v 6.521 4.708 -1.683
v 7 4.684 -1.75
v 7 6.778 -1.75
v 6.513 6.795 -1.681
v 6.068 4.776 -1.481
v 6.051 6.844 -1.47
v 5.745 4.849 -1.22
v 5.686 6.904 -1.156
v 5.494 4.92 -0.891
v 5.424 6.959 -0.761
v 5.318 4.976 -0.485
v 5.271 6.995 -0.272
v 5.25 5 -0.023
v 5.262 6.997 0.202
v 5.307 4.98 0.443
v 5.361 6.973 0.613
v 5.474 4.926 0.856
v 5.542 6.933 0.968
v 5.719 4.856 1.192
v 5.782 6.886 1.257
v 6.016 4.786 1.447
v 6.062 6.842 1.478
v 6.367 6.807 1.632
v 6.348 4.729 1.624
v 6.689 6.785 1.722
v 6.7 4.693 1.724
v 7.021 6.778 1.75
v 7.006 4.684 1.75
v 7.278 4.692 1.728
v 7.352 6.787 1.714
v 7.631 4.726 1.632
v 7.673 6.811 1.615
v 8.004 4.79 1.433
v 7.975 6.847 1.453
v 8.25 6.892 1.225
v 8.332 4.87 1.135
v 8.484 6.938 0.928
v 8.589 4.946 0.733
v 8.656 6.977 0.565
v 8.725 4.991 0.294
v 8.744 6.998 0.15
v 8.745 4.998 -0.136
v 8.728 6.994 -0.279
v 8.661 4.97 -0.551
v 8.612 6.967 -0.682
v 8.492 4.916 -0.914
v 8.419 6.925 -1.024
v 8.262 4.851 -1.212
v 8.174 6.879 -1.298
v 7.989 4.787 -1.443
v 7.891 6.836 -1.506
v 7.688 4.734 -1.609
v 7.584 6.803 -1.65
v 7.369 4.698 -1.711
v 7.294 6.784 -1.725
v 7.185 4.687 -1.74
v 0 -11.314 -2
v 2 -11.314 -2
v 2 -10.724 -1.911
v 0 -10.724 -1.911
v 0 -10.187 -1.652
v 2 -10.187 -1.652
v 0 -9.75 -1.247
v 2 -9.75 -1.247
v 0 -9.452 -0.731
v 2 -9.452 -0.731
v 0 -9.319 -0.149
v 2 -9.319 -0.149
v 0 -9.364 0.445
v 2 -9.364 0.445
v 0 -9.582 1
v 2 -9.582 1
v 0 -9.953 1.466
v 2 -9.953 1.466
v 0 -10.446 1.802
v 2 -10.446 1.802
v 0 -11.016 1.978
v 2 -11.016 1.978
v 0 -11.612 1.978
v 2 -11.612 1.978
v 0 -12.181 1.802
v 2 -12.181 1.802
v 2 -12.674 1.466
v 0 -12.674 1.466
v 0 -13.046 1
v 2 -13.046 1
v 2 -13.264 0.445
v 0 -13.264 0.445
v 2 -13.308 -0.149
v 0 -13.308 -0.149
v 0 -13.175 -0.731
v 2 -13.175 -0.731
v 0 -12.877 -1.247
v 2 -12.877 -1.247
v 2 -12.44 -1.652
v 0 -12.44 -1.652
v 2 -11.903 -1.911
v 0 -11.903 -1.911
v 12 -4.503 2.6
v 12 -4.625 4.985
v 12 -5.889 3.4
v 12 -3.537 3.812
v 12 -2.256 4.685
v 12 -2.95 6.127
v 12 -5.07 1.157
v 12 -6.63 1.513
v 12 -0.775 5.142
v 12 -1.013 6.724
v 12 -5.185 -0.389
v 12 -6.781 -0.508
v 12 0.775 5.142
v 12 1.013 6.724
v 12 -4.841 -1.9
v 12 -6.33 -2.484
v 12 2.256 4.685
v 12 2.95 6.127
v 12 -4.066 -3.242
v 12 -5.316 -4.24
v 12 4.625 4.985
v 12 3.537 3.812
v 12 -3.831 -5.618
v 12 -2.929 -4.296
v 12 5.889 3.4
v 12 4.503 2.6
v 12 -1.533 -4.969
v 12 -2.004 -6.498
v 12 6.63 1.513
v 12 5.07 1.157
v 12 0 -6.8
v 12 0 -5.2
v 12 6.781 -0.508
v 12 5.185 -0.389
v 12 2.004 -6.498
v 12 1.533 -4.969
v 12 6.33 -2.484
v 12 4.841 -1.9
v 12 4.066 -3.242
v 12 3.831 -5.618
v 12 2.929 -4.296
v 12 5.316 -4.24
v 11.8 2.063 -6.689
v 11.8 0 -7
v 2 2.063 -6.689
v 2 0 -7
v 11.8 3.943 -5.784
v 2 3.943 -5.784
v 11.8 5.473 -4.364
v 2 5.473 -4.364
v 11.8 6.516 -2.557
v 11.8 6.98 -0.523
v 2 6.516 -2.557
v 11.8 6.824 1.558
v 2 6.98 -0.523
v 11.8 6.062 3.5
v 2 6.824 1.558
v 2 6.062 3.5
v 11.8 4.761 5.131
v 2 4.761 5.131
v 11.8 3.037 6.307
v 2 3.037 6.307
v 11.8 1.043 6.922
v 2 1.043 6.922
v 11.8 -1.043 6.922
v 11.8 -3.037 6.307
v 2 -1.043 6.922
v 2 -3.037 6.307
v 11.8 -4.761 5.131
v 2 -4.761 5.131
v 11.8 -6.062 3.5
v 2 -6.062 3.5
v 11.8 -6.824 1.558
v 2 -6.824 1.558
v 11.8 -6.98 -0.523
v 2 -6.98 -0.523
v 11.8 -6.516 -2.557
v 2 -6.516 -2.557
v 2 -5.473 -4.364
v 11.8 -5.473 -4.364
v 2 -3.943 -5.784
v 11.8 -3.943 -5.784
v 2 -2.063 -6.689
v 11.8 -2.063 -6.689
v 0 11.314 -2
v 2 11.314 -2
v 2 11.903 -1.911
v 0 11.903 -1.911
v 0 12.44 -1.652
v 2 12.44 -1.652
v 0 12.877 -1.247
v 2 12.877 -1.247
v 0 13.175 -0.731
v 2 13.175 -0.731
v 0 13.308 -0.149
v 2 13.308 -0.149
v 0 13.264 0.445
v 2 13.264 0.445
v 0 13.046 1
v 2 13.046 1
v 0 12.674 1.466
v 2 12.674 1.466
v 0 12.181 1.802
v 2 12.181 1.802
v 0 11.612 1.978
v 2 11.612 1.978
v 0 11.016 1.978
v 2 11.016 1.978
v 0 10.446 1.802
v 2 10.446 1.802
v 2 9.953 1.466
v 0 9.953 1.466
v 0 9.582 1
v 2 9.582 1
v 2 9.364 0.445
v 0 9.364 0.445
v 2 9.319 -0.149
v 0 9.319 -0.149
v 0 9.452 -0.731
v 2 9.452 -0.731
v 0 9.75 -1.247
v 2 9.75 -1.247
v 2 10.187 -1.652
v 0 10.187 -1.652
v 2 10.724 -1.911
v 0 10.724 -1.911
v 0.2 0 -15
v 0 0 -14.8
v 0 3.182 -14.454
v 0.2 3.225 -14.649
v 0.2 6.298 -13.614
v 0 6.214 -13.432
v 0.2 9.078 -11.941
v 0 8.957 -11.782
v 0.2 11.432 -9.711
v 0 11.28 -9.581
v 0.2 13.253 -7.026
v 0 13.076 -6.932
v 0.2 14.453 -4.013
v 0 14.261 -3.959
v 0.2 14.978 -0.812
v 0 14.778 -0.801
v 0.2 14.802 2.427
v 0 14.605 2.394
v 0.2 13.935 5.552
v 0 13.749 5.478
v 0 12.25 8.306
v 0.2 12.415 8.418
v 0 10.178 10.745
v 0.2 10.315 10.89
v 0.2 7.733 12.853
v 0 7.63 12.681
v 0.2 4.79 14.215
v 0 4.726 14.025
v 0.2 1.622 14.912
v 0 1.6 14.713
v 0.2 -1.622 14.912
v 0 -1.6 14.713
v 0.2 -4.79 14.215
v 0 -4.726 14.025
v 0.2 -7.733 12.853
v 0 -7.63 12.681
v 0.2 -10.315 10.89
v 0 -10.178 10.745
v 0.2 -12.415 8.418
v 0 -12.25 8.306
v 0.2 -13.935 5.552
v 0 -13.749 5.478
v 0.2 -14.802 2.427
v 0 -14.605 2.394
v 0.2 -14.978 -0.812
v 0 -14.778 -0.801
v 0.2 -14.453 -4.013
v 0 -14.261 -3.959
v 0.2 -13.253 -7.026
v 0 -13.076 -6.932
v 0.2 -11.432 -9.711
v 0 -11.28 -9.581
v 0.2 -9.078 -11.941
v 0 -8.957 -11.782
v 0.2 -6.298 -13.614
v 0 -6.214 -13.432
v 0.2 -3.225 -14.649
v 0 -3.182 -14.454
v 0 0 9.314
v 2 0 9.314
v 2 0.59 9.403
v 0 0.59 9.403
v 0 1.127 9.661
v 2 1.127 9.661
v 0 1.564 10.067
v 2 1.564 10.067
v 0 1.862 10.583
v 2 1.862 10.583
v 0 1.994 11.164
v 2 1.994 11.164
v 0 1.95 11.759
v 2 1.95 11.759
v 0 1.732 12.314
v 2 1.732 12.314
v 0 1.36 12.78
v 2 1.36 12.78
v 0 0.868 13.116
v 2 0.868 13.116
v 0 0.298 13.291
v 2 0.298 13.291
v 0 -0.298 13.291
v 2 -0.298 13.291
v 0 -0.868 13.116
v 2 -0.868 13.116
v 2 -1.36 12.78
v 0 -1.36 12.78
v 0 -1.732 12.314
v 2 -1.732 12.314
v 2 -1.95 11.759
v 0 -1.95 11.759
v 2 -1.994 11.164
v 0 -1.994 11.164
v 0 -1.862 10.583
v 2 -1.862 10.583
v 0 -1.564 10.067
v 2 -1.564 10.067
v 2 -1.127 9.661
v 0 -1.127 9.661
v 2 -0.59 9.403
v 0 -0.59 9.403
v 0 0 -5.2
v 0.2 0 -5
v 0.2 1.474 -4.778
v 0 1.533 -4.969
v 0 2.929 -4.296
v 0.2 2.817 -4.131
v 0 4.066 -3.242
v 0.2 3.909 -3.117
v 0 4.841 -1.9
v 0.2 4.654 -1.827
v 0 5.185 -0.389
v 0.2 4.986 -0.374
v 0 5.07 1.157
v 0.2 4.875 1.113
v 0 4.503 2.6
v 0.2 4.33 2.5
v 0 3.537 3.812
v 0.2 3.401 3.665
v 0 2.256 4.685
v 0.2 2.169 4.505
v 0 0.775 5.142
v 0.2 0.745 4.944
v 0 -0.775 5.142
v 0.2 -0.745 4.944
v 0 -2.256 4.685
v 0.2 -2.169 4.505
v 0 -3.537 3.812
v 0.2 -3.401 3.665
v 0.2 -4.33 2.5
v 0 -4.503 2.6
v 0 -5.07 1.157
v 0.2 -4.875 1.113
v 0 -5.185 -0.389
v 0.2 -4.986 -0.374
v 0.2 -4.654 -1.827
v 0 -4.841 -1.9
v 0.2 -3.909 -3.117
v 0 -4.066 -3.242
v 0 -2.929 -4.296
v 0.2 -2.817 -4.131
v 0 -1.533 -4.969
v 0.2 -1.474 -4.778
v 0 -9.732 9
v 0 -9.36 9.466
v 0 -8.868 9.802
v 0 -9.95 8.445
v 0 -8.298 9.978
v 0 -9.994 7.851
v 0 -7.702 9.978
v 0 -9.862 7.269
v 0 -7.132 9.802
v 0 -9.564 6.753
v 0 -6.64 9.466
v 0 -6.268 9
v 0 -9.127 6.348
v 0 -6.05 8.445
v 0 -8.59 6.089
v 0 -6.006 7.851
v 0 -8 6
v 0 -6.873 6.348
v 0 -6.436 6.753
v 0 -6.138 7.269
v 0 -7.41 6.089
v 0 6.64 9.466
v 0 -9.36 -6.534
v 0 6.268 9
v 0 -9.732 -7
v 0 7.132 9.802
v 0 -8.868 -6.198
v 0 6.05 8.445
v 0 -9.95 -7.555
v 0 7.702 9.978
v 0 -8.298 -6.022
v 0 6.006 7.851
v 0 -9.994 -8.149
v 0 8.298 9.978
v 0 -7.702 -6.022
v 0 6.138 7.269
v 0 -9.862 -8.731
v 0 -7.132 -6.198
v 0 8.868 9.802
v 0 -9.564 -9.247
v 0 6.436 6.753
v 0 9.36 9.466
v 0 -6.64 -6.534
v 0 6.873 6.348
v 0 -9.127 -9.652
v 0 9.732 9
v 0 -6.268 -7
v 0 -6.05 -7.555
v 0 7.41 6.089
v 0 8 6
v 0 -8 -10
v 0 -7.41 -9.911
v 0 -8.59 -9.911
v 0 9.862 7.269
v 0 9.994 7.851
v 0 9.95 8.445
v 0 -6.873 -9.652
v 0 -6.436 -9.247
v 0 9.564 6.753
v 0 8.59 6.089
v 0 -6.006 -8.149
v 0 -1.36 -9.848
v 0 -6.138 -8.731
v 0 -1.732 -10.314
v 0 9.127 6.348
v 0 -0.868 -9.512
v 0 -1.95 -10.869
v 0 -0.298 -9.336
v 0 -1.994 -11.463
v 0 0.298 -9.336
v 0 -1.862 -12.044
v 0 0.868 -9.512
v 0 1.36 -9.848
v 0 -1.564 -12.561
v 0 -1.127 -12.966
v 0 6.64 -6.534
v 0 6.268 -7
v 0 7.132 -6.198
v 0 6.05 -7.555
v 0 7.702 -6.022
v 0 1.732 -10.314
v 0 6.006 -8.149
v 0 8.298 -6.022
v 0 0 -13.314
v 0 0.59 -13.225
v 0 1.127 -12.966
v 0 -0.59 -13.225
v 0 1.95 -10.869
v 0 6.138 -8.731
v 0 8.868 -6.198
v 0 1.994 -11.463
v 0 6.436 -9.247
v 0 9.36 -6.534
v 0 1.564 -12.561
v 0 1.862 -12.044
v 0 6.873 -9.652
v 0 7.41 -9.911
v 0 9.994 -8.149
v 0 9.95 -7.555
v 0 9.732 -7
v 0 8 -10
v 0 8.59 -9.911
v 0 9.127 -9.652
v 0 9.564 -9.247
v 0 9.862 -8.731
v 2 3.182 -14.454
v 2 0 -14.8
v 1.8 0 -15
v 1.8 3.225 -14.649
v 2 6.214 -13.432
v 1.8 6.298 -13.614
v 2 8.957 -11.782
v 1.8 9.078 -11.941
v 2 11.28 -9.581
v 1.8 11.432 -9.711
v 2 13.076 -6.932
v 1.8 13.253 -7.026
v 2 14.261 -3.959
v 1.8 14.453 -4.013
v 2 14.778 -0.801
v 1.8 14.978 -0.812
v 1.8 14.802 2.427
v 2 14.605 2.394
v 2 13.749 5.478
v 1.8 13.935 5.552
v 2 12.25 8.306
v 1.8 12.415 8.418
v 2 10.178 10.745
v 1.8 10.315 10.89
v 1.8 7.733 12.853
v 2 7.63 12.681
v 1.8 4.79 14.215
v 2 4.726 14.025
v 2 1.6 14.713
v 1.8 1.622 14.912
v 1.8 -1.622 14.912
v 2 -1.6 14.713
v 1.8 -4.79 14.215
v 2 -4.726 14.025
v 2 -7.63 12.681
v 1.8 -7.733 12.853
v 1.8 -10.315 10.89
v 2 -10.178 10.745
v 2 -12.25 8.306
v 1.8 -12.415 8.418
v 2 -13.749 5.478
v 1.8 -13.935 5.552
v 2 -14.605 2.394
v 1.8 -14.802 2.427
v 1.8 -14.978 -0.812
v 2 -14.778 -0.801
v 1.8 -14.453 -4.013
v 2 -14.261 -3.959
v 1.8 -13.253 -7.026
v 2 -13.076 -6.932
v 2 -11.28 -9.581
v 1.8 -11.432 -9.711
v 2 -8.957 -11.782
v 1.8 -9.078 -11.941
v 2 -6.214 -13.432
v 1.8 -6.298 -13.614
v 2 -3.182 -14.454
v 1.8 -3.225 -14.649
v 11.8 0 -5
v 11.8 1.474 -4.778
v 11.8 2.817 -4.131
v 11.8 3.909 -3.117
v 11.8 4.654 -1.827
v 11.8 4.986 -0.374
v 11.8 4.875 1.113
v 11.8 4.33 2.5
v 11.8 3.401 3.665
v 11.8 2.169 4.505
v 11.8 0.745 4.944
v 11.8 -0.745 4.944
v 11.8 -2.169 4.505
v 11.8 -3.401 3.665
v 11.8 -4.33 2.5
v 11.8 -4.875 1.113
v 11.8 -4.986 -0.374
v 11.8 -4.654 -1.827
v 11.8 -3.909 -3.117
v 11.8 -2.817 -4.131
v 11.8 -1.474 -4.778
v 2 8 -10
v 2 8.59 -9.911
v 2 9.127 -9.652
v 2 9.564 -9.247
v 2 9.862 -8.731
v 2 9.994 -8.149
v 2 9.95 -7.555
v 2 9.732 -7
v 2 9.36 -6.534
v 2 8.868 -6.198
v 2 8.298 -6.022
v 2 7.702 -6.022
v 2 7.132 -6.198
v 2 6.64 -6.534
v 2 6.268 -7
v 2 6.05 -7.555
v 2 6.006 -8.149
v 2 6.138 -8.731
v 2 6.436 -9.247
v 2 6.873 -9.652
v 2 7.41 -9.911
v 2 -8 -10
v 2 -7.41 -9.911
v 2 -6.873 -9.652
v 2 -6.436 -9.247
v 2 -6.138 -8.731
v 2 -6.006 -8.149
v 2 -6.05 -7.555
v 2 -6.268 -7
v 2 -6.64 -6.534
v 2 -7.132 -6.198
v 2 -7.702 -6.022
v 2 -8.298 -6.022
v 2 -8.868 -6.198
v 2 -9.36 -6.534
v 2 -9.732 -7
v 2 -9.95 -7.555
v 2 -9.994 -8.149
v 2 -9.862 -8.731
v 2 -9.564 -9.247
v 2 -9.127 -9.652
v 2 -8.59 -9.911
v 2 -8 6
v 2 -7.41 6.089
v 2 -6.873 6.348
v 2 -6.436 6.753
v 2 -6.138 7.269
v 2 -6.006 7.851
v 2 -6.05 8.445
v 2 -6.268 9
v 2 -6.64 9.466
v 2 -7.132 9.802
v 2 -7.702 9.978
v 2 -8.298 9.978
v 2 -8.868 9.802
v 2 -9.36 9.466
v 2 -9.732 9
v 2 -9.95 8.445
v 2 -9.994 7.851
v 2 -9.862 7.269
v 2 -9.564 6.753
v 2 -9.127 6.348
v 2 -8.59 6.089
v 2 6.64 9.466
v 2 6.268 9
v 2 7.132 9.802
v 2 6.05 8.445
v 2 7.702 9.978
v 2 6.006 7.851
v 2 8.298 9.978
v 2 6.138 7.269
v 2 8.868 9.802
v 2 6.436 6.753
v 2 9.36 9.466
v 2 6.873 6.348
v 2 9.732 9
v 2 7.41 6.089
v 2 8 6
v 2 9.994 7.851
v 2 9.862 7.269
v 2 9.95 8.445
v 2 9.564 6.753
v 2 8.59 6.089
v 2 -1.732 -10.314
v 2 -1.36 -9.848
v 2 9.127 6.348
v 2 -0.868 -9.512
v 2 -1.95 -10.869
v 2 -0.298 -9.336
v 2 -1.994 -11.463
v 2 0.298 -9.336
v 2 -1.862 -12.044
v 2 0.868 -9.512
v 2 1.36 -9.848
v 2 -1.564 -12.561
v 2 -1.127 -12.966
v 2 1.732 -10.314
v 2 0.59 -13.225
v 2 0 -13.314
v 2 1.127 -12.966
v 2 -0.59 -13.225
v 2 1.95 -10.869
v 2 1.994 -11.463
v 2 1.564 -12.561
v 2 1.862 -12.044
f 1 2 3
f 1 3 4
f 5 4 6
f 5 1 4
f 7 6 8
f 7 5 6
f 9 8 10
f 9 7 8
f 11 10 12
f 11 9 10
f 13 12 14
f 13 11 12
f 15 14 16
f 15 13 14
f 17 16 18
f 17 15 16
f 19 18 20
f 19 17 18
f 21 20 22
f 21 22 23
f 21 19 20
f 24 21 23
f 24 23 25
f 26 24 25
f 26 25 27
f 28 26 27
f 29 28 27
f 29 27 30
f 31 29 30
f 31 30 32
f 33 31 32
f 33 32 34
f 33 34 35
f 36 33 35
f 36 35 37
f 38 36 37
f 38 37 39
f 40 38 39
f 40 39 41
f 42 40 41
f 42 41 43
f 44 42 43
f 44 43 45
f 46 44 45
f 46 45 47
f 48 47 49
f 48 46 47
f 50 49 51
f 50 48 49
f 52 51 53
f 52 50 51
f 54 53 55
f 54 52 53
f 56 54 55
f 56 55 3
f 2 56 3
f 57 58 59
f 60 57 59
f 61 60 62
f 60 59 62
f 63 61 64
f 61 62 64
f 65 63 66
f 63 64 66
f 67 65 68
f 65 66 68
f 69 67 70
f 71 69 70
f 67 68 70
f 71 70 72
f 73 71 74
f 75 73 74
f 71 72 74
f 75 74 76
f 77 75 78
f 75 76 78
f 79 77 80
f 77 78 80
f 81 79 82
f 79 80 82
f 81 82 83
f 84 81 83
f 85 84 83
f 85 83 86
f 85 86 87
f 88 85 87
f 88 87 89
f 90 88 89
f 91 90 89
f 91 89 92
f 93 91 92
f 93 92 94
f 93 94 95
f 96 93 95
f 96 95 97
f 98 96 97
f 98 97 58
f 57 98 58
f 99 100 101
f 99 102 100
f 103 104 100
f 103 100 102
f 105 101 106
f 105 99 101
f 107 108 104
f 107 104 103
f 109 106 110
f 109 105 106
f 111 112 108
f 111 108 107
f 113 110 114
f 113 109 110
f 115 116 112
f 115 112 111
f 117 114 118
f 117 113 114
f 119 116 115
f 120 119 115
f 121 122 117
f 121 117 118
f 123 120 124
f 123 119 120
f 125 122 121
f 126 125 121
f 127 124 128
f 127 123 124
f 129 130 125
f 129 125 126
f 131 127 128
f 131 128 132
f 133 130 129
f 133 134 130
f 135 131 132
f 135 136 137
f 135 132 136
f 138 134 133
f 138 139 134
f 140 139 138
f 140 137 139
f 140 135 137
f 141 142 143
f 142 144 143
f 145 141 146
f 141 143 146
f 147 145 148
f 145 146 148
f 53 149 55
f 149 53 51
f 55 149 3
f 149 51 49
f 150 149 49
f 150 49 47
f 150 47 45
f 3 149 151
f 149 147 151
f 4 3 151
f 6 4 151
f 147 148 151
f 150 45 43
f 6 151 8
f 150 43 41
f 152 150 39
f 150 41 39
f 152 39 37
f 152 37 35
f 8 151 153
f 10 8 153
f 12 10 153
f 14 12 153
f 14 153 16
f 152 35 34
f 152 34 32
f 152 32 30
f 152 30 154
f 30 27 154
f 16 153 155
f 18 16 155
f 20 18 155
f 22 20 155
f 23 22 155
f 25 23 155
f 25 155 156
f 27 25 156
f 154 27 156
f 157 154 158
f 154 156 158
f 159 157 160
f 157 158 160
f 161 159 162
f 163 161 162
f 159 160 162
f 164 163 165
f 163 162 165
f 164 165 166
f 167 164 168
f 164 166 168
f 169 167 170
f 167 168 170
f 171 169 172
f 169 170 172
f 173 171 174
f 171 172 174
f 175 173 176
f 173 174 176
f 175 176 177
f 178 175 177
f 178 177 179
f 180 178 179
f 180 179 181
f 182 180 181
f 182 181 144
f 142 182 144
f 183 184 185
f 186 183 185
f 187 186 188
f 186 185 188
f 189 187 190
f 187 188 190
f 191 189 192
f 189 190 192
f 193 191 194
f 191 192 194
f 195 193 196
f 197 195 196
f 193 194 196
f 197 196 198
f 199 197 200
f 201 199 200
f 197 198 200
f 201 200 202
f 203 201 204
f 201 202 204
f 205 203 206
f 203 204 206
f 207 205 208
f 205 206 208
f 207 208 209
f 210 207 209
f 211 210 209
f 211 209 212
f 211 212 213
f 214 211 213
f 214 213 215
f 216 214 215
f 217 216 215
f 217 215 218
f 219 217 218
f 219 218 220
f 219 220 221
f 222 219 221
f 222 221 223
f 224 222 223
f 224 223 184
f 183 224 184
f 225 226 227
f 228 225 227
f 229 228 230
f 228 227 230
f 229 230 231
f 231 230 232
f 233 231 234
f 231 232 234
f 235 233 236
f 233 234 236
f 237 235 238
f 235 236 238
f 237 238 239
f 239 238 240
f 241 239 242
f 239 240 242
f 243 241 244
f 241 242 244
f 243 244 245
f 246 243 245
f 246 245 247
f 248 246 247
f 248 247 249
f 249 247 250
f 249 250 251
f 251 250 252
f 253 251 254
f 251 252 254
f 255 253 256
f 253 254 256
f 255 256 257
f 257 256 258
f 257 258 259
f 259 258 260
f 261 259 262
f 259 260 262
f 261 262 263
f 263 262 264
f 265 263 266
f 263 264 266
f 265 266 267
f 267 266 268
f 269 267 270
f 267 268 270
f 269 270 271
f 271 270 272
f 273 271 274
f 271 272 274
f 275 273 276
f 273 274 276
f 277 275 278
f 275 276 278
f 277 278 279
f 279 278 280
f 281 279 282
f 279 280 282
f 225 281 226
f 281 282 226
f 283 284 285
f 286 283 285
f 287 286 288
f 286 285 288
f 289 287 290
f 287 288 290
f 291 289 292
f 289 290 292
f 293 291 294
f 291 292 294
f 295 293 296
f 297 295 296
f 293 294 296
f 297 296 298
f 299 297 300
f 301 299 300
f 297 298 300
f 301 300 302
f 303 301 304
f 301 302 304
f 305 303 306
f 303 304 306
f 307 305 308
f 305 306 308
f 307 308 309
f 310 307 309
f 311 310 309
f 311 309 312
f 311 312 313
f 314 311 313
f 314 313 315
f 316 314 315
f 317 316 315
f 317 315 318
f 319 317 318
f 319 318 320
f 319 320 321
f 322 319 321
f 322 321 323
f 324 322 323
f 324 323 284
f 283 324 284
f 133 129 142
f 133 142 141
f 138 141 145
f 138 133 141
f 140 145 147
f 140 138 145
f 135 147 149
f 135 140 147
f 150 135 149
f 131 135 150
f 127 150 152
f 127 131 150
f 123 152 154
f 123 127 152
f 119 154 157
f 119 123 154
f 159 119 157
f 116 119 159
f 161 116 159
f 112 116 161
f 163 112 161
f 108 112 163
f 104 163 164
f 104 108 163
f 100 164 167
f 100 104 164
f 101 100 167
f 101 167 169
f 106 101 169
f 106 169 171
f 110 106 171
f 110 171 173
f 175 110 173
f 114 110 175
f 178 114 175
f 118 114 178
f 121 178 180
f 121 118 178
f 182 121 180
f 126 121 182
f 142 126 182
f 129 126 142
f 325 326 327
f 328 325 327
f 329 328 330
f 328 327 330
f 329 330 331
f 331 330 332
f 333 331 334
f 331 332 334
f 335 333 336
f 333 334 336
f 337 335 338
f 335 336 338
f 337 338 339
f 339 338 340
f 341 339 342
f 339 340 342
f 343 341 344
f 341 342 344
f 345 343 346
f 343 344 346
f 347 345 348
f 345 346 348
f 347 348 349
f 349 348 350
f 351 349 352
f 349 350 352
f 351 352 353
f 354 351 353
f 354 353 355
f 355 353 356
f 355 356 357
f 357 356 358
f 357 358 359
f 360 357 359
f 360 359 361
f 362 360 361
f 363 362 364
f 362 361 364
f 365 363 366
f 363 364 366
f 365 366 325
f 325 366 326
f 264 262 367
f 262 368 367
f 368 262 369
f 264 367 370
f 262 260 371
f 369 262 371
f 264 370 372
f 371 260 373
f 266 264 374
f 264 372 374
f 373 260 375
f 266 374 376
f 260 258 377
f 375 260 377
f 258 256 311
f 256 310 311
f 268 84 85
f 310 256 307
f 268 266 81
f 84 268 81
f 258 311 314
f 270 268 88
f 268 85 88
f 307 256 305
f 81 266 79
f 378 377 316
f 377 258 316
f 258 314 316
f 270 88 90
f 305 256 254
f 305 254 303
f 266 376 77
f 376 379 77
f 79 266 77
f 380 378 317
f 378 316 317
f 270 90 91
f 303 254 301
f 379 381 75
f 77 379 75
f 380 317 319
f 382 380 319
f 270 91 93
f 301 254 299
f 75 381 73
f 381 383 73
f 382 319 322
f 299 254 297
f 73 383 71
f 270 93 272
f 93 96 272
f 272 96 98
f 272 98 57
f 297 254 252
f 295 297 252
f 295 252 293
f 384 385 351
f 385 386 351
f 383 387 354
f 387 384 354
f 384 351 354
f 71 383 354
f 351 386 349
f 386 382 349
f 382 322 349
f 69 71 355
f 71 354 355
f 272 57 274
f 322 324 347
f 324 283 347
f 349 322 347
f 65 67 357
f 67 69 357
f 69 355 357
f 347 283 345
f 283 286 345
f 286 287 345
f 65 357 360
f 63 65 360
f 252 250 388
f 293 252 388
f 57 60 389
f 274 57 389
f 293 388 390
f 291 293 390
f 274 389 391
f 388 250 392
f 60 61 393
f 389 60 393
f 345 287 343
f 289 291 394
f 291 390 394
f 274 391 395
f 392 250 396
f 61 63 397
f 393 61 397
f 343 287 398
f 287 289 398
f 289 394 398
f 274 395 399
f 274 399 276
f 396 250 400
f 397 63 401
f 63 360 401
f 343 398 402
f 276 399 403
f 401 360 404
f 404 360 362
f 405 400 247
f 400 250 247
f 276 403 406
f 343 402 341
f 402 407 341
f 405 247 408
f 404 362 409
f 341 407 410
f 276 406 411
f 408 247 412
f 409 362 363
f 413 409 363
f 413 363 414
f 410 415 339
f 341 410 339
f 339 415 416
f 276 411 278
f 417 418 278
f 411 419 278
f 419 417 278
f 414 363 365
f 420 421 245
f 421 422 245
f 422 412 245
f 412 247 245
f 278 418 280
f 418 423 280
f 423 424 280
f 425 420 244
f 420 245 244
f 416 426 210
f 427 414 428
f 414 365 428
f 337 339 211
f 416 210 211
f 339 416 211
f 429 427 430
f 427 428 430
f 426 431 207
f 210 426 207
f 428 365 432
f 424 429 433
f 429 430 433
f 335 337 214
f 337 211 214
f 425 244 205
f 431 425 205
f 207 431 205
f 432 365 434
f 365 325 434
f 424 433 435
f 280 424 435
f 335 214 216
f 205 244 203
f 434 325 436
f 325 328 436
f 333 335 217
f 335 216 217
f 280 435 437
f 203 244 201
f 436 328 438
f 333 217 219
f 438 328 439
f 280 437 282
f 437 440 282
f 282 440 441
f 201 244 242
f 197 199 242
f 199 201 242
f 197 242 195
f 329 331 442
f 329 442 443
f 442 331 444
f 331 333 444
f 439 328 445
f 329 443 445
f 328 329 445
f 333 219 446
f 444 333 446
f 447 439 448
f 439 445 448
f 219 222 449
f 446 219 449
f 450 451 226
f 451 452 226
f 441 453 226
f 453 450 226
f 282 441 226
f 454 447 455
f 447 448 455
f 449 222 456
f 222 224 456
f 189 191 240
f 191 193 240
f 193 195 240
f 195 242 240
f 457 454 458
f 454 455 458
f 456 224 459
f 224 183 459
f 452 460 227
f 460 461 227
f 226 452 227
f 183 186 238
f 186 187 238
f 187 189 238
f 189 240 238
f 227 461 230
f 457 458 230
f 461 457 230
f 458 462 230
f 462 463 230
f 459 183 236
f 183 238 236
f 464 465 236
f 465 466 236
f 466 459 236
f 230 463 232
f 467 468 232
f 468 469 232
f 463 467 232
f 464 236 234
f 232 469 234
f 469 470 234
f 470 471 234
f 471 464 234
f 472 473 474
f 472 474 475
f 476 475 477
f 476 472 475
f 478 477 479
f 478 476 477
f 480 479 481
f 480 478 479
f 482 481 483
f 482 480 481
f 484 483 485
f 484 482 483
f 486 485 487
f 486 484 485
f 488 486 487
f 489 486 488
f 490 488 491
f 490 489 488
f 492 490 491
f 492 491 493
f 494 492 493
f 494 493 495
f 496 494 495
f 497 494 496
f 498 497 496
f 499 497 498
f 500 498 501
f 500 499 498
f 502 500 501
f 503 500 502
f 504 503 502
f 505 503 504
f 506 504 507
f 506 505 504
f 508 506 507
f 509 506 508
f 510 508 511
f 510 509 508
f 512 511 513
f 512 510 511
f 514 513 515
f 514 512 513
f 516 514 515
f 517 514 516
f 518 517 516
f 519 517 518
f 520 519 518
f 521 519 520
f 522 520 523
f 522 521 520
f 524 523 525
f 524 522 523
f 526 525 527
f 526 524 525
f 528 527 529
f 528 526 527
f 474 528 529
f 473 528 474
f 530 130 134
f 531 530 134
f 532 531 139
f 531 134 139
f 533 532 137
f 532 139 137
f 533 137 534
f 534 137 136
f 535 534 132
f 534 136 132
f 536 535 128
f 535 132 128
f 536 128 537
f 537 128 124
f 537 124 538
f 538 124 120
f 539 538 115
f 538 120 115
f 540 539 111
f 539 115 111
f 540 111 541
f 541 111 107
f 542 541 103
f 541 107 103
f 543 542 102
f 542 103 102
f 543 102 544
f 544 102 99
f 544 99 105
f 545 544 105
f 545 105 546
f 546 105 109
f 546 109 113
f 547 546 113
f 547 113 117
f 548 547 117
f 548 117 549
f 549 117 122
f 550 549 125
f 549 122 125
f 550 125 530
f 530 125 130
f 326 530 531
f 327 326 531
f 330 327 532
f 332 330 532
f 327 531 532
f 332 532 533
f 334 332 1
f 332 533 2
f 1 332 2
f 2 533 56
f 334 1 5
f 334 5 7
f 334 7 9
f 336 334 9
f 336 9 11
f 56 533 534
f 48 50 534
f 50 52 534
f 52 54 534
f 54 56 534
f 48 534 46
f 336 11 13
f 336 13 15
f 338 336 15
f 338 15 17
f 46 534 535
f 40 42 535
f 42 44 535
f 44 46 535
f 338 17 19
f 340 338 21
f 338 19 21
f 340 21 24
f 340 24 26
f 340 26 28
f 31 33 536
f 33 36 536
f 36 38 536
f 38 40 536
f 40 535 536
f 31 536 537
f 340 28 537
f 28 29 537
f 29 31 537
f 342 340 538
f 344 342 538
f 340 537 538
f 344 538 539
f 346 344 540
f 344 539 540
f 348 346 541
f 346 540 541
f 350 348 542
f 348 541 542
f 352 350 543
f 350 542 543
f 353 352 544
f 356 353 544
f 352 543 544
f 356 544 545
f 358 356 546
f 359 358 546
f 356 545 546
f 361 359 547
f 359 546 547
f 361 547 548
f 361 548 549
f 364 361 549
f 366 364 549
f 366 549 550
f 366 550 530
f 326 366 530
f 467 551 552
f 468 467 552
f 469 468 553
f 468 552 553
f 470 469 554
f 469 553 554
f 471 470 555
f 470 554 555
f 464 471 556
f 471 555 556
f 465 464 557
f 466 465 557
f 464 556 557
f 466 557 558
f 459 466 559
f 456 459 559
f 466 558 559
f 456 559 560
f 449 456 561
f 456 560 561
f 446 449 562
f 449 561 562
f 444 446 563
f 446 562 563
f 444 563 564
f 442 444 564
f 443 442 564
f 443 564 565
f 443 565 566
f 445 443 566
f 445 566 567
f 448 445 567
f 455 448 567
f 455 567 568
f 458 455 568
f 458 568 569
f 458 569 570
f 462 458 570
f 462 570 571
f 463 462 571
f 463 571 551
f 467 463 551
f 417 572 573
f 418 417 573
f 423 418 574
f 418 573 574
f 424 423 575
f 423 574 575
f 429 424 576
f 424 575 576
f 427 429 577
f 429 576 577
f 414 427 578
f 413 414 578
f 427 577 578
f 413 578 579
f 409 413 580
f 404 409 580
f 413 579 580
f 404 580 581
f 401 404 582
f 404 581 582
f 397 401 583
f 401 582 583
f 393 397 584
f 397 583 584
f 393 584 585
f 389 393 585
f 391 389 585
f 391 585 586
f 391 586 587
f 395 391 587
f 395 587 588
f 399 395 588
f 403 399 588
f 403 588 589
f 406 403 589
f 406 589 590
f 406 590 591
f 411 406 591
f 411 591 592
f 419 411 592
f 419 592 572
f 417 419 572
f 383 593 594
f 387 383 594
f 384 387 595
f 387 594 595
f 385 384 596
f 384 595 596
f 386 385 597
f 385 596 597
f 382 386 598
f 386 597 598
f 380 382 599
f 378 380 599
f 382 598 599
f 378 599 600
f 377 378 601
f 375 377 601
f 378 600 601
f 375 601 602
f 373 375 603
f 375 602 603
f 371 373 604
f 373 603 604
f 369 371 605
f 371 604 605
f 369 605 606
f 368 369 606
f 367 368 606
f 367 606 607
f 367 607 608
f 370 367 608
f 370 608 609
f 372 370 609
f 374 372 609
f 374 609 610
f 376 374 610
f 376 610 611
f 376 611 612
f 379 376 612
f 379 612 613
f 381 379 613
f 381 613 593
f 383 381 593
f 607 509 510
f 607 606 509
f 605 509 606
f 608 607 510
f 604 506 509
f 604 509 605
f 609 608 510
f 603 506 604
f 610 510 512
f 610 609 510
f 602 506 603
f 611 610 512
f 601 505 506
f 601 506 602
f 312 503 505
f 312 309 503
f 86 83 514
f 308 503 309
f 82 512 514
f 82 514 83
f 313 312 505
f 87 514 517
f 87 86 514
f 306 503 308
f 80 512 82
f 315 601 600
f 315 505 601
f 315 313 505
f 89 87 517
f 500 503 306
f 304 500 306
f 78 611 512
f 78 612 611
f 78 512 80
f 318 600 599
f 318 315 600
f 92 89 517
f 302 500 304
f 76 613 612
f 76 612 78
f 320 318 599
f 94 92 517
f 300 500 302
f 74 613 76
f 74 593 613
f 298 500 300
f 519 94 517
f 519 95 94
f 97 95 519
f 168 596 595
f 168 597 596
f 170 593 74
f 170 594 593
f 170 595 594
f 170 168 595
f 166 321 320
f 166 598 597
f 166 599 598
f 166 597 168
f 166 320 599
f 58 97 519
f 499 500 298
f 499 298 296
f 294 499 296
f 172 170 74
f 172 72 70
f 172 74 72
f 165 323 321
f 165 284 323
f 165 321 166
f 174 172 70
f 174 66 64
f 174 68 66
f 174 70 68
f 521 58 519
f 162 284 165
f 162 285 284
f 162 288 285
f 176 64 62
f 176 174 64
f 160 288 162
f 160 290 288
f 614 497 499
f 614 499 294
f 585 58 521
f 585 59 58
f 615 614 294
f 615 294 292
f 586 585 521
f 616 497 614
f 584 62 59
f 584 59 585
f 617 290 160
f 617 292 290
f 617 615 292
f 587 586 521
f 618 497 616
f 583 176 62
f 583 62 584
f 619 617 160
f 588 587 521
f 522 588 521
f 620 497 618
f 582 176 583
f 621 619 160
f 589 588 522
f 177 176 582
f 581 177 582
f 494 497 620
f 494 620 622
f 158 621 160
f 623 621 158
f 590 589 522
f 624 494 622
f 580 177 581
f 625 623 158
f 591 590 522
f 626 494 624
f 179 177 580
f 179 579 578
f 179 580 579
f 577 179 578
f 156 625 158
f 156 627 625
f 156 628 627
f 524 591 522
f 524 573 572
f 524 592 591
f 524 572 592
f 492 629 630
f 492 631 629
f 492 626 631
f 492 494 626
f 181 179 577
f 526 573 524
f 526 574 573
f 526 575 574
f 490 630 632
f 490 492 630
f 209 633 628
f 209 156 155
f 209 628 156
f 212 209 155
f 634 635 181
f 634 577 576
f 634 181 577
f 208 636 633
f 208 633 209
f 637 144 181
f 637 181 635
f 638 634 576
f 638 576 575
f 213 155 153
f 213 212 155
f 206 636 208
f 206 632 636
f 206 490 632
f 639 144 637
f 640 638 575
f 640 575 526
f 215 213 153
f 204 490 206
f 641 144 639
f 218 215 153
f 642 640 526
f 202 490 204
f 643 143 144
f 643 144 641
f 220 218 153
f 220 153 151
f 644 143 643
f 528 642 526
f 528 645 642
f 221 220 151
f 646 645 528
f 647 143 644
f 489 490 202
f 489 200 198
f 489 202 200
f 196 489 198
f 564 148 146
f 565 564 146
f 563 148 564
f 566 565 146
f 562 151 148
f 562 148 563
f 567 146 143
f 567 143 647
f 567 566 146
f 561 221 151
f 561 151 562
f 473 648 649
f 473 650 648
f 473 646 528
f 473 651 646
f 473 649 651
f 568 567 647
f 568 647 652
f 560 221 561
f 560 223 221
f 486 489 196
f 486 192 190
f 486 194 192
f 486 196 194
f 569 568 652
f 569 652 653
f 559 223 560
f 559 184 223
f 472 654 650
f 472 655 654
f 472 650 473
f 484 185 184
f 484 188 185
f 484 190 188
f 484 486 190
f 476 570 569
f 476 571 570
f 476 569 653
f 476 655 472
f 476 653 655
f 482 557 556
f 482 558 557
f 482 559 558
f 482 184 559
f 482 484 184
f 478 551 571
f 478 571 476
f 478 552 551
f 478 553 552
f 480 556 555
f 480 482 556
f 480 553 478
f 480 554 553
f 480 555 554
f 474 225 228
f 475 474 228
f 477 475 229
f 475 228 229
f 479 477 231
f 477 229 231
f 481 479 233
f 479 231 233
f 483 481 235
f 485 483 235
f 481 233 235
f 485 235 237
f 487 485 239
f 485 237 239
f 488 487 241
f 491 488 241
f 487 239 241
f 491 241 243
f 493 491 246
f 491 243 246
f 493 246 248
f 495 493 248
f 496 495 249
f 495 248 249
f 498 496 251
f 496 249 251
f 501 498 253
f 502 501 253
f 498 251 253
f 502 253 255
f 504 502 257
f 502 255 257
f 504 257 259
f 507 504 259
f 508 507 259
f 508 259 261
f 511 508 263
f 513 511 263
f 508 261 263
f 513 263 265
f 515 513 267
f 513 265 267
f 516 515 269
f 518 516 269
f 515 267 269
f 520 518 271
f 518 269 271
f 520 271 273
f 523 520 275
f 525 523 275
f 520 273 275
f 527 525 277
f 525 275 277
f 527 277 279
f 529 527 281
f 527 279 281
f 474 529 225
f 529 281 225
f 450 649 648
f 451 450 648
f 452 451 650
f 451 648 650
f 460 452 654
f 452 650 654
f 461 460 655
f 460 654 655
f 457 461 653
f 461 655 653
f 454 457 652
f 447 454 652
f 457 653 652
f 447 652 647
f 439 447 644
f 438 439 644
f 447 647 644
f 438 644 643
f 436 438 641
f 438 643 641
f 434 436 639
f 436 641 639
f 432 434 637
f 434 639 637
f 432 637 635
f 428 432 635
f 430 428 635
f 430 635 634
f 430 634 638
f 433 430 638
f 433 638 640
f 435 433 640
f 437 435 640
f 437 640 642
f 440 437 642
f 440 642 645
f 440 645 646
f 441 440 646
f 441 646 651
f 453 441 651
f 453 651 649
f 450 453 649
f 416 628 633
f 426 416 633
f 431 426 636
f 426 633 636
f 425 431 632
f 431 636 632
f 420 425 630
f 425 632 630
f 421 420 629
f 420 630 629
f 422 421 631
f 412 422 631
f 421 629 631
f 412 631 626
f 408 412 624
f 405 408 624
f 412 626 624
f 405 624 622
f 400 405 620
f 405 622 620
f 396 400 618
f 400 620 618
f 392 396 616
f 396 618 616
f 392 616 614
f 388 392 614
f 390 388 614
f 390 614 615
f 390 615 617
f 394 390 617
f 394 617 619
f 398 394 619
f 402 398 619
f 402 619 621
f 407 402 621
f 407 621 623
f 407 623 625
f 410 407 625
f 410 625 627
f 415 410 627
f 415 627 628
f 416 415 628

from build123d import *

# Parameters (mm, degrees)
SKETCH_1_R          = 15
EXTRUDE_1_DEPTH     = 2
SKETCH_2_R          = 7
EXTRUDE_2_DEPTH     = 10
SKETCH_3_R          = 2
CUT_EXTRUDE_1_DEPTH = 24.452078799
SKETCH_4_R          = 5
CUT_EXTRUDE_2_DEPTH = 25.372115214
CHAMFER_1_SIZE      = 0.2
SKETCH_5_R          = 1.75
CUT_EXTRUDE_3_DEPTH = 10


with BuildPart() as part:
    # 草图1 → 凸台-拉伸1 (new body)
    with BuildSketch(Plane(origin=(0, 0, 0), x_dir=(0, 0, -1), z_dir=(1, 0, 0))):
        Circle(SKETCH_1_R)
    extrude(amount=EXTRUDE_1_DEPTH)

    # 草图2 → 凸台-拉伸2 (add)
    with BuildSketch(Plane(origin=(2, 0, 0), x_dir=(0, 0, -1), z_dir=(1, 0, 0))):
        Circle(SKETCH_2_R)
    extrude(amount=EXTRUDE_2_DEPTH)

    # 草图3 → 切除-拉伸1 (cut, through all)
    with BuildSketch(Plane(origin=(2, 0, 0), x_dir=(0, 0, -1), z_dir=(1, 0, 0))):
        with Locations((0, 11.313708499)):
            Circle(SKETCH_3_R)
        with Locations((8, 8)):
            Circle(SKETCH_3_R)
        with Locations((11.313708499, 0)):
            Circle(SKETCH_3_R)
        with Locations((8, -8)):
            Circle(SKETCH_3_R)
        with Locations((0, -11.313708499)):
            Circle(SKETCH_3_R)
        with Locations((-8, -8)):
            Circle(SKETCH_3_R)
        with Locations((-11.313708499, 0)):
            Circle(SKETCH_3_R)
        with Locations((-8, 8)):
            Circle(SKETCH_3_R)
    extrude(amount=-CUT_EXTRUDE_1_DEPTH, mode=Mode.SUBTRACT)

    # 草图4 → 切除-拉伸2 (cut, through all)
    with BuildSketch(Plane(origin=(12, 0, 0), x_dir=(0, 0, -1), z_dir=(1, 0, 0))):
        Circle(SKETCH_4_R)
    extrude(amount=-CUT_EXTRUDE_2_DEPTH, mode=Mode.SUBTRACT)

    # 倒角1
    chamfer_1_edges = [part.edges().sort_by_distance(p)[0] for p in [
        (0, 0, 15),
        (0, 0, 5),
        (12, 0, 5),
        (2, 0, 15),
        (12, 0, 7),
    ]]
    chamfer(chamfer_1_edges, length=CHAMFER_1_SIZE)

    # 草图5 → 切除-拉伸3 (cut)
    with BuildSketch(Plane(origin=(0, 0, 0), x_dir=(1, 0, 0), z_dir=(0, 1, 0))):
        with Locations(Location((7, 0, 0), (0, 0, 90))):
            Circle(SKETCH_5_R)
    extrude(amount=CUT_EXTRUDE_3_DEPTH, mode=Mode.SUBTRACT)


solid = part.part
